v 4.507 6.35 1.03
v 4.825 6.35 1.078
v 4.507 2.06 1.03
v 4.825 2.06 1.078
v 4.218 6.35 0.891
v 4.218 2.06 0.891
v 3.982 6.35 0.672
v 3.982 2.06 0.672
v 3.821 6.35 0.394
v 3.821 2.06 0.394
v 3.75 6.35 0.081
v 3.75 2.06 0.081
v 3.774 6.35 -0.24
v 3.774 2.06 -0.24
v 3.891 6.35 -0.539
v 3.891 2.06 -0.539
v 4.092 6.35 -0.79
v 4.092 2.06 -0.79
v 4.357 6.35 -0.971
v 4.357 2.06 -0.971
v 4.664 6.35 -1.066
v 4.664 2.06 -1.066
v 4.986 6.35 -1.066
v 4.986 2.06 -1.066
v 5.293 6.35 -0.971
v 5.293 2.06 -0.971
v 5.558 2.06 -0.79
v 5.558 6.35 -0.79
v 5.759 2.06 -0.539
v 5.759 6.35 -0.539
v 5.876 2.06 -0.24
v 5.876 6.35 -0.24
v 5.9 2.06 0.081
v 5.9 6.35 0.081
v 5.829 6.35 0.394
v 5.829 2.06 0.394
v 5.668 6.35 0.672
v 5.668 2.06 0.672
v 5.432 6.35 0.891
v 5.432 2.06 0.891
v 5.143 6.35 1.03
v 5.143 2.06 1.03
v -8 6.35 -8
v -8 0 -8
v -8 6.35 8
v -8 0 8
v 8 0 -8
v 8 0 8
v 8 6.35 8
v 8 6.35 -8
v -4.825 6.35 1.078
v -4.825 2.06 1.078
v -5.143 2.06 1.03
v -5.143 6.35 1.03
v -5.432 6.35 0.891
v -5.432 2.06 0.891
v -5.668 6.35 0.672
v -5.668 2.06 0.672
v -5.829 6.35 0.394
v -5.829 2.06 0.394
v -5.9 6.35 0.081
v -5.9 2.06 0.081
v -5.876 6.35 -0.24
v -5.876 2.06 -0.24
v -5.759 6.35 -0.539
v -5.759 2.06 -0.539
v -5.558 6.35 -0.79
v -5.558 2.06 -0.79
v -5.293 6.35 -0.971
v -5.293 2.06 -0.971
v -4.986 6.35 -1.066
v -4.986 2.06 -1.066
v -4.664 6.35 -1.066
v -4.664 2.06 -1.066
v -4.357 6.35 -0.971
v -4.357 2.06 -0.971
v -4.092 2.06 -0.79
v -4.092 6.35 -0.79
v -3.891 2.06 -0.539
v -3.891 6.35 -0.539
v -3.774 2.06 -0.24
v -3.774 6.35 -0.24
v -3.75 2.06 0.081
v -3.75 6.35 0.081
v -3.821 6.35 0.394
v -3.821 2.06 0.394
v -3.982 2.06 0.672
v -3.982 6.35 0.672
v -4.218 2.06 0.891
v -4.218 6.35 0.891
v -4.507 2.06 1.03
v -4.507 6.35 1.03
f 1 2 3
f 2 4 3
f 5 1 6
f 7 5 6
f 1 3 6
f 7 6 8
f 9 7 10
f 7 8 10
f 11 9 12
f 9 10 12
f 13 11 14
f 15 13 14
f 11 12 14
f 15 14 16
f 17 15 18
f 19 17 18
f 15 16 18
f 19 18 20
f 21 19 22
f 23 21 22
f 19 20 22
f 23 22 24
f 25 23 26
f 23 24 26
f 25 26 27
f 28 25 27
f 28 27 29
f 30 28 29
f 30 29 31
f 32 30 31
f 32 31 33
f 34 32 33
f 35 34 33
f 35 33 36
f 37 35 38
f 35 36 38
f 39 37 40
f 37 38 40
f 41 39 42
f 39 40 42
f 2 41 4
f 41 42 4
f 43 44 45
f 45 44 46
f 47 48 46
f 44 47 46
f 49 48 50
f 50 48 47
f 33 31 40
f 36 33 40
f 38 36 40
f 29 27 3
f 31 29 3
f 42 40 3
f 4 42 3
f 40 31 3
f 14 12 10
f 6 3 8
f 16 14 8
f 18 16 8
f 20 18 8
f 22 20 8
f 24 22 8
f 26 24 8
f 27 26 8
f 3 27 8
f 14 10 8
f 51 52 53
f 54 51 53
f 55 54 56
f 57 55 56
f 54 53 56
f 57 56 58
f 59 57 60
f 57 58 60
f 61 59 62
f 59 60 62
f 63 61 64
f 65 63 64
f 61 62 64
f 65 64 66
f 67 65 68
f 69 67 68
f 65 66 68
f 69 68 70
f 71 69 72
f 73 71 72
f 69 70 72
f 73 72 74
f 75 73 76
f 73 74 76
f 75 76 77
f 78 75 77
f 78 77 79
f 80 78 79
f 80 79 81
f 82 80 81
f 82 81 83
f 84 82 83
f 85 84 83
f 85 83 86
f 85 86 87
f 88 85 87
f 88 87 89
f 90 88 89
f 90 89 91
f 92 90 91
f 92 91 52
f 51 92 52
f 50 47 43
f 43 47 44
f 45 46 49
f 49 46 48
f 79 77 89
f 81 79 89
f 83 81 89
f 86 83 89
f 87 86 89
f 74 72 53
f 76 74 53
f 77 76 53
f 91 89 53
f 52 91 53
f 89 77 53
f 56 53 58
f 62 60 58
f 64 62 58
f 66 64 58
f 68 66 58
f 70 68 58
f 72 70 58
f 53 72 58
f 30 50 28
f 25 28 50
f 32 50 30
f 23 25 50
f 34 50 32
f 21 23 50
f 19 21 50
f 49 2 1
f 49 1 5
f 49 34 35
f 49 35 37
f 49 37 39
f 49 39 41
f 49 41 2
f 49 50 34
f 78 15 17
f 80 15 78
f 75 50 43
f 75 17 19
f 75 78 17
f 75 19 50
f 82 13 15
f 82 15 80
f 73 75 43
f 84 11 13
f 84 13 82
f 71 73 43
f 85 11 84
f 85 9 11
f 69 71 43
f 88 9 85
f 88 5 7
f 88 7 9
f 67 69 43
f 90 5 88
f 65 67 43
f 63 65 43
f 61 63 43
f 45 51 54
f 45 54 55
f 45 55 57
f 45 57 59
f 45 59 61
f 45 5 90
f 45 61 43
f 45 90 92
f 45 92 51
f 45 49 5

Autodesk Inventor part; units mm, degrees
ref_plane "YZ Plane" through (0, 0, 0) normal (1, 0, 0) x (0, 1, 0)
ref_plane "XZ Plane" through (0, 0, 0) normal (0, 1, 0) x (-1, 0, 0)
ref_plane "XY Plane" through (0, 0, 0) normal (0, 0, 1) x (1, 0, 0)
sketch "Sketch1" plane through (0, 0, 0) normal (0, 1, 0) x (-1, 0, 0)
  line L0 (8, 8) -> (-8, 8)
  line L1 (-8, 8) -> (-8, -8)
  line L2 (-8, -8) -> (8, -8)
  line L3 (8, -8) -> (8, 8)
  line L4 (8, 8) -> (-8, -8) construction
  line L5 (-8, 8) -> (8, -8) construction
  point P0 (0, 0)
  dimension "d0" = 16
  dimension "d1" = 16
extrude "Extrusion1" add sketch "Sketch1" along normal blind 6.35
sketch "Sketch2" plane through (0, 6.35, 0) normal (0, 1, 0) x (1, 0, 0)
  line L0 (-8, 8) -> (-8, -8) projected
  line L1 (8, -8) -> (8, 8) projected
  point P0 (0, 0)
  point P1 (-4.825, 0)
  point P2 (4.825, 0)
hole "Hole1" at (-4.825, 6.35, 0) at (4.825, 6.35, 0) direction (0, -1, 0) diameter 2.1565 depth 4.29 thread size "4-40 UNC" class "2B" standard "ANSI Unified Screw Threads"
sketch "Sketch3" plane through (8, 0, -8) normal (0, 0, -1) x (-1, 0, 0)
  point P0 (8, 0)
properties part number "bottom_cu_block" material "Copper"
